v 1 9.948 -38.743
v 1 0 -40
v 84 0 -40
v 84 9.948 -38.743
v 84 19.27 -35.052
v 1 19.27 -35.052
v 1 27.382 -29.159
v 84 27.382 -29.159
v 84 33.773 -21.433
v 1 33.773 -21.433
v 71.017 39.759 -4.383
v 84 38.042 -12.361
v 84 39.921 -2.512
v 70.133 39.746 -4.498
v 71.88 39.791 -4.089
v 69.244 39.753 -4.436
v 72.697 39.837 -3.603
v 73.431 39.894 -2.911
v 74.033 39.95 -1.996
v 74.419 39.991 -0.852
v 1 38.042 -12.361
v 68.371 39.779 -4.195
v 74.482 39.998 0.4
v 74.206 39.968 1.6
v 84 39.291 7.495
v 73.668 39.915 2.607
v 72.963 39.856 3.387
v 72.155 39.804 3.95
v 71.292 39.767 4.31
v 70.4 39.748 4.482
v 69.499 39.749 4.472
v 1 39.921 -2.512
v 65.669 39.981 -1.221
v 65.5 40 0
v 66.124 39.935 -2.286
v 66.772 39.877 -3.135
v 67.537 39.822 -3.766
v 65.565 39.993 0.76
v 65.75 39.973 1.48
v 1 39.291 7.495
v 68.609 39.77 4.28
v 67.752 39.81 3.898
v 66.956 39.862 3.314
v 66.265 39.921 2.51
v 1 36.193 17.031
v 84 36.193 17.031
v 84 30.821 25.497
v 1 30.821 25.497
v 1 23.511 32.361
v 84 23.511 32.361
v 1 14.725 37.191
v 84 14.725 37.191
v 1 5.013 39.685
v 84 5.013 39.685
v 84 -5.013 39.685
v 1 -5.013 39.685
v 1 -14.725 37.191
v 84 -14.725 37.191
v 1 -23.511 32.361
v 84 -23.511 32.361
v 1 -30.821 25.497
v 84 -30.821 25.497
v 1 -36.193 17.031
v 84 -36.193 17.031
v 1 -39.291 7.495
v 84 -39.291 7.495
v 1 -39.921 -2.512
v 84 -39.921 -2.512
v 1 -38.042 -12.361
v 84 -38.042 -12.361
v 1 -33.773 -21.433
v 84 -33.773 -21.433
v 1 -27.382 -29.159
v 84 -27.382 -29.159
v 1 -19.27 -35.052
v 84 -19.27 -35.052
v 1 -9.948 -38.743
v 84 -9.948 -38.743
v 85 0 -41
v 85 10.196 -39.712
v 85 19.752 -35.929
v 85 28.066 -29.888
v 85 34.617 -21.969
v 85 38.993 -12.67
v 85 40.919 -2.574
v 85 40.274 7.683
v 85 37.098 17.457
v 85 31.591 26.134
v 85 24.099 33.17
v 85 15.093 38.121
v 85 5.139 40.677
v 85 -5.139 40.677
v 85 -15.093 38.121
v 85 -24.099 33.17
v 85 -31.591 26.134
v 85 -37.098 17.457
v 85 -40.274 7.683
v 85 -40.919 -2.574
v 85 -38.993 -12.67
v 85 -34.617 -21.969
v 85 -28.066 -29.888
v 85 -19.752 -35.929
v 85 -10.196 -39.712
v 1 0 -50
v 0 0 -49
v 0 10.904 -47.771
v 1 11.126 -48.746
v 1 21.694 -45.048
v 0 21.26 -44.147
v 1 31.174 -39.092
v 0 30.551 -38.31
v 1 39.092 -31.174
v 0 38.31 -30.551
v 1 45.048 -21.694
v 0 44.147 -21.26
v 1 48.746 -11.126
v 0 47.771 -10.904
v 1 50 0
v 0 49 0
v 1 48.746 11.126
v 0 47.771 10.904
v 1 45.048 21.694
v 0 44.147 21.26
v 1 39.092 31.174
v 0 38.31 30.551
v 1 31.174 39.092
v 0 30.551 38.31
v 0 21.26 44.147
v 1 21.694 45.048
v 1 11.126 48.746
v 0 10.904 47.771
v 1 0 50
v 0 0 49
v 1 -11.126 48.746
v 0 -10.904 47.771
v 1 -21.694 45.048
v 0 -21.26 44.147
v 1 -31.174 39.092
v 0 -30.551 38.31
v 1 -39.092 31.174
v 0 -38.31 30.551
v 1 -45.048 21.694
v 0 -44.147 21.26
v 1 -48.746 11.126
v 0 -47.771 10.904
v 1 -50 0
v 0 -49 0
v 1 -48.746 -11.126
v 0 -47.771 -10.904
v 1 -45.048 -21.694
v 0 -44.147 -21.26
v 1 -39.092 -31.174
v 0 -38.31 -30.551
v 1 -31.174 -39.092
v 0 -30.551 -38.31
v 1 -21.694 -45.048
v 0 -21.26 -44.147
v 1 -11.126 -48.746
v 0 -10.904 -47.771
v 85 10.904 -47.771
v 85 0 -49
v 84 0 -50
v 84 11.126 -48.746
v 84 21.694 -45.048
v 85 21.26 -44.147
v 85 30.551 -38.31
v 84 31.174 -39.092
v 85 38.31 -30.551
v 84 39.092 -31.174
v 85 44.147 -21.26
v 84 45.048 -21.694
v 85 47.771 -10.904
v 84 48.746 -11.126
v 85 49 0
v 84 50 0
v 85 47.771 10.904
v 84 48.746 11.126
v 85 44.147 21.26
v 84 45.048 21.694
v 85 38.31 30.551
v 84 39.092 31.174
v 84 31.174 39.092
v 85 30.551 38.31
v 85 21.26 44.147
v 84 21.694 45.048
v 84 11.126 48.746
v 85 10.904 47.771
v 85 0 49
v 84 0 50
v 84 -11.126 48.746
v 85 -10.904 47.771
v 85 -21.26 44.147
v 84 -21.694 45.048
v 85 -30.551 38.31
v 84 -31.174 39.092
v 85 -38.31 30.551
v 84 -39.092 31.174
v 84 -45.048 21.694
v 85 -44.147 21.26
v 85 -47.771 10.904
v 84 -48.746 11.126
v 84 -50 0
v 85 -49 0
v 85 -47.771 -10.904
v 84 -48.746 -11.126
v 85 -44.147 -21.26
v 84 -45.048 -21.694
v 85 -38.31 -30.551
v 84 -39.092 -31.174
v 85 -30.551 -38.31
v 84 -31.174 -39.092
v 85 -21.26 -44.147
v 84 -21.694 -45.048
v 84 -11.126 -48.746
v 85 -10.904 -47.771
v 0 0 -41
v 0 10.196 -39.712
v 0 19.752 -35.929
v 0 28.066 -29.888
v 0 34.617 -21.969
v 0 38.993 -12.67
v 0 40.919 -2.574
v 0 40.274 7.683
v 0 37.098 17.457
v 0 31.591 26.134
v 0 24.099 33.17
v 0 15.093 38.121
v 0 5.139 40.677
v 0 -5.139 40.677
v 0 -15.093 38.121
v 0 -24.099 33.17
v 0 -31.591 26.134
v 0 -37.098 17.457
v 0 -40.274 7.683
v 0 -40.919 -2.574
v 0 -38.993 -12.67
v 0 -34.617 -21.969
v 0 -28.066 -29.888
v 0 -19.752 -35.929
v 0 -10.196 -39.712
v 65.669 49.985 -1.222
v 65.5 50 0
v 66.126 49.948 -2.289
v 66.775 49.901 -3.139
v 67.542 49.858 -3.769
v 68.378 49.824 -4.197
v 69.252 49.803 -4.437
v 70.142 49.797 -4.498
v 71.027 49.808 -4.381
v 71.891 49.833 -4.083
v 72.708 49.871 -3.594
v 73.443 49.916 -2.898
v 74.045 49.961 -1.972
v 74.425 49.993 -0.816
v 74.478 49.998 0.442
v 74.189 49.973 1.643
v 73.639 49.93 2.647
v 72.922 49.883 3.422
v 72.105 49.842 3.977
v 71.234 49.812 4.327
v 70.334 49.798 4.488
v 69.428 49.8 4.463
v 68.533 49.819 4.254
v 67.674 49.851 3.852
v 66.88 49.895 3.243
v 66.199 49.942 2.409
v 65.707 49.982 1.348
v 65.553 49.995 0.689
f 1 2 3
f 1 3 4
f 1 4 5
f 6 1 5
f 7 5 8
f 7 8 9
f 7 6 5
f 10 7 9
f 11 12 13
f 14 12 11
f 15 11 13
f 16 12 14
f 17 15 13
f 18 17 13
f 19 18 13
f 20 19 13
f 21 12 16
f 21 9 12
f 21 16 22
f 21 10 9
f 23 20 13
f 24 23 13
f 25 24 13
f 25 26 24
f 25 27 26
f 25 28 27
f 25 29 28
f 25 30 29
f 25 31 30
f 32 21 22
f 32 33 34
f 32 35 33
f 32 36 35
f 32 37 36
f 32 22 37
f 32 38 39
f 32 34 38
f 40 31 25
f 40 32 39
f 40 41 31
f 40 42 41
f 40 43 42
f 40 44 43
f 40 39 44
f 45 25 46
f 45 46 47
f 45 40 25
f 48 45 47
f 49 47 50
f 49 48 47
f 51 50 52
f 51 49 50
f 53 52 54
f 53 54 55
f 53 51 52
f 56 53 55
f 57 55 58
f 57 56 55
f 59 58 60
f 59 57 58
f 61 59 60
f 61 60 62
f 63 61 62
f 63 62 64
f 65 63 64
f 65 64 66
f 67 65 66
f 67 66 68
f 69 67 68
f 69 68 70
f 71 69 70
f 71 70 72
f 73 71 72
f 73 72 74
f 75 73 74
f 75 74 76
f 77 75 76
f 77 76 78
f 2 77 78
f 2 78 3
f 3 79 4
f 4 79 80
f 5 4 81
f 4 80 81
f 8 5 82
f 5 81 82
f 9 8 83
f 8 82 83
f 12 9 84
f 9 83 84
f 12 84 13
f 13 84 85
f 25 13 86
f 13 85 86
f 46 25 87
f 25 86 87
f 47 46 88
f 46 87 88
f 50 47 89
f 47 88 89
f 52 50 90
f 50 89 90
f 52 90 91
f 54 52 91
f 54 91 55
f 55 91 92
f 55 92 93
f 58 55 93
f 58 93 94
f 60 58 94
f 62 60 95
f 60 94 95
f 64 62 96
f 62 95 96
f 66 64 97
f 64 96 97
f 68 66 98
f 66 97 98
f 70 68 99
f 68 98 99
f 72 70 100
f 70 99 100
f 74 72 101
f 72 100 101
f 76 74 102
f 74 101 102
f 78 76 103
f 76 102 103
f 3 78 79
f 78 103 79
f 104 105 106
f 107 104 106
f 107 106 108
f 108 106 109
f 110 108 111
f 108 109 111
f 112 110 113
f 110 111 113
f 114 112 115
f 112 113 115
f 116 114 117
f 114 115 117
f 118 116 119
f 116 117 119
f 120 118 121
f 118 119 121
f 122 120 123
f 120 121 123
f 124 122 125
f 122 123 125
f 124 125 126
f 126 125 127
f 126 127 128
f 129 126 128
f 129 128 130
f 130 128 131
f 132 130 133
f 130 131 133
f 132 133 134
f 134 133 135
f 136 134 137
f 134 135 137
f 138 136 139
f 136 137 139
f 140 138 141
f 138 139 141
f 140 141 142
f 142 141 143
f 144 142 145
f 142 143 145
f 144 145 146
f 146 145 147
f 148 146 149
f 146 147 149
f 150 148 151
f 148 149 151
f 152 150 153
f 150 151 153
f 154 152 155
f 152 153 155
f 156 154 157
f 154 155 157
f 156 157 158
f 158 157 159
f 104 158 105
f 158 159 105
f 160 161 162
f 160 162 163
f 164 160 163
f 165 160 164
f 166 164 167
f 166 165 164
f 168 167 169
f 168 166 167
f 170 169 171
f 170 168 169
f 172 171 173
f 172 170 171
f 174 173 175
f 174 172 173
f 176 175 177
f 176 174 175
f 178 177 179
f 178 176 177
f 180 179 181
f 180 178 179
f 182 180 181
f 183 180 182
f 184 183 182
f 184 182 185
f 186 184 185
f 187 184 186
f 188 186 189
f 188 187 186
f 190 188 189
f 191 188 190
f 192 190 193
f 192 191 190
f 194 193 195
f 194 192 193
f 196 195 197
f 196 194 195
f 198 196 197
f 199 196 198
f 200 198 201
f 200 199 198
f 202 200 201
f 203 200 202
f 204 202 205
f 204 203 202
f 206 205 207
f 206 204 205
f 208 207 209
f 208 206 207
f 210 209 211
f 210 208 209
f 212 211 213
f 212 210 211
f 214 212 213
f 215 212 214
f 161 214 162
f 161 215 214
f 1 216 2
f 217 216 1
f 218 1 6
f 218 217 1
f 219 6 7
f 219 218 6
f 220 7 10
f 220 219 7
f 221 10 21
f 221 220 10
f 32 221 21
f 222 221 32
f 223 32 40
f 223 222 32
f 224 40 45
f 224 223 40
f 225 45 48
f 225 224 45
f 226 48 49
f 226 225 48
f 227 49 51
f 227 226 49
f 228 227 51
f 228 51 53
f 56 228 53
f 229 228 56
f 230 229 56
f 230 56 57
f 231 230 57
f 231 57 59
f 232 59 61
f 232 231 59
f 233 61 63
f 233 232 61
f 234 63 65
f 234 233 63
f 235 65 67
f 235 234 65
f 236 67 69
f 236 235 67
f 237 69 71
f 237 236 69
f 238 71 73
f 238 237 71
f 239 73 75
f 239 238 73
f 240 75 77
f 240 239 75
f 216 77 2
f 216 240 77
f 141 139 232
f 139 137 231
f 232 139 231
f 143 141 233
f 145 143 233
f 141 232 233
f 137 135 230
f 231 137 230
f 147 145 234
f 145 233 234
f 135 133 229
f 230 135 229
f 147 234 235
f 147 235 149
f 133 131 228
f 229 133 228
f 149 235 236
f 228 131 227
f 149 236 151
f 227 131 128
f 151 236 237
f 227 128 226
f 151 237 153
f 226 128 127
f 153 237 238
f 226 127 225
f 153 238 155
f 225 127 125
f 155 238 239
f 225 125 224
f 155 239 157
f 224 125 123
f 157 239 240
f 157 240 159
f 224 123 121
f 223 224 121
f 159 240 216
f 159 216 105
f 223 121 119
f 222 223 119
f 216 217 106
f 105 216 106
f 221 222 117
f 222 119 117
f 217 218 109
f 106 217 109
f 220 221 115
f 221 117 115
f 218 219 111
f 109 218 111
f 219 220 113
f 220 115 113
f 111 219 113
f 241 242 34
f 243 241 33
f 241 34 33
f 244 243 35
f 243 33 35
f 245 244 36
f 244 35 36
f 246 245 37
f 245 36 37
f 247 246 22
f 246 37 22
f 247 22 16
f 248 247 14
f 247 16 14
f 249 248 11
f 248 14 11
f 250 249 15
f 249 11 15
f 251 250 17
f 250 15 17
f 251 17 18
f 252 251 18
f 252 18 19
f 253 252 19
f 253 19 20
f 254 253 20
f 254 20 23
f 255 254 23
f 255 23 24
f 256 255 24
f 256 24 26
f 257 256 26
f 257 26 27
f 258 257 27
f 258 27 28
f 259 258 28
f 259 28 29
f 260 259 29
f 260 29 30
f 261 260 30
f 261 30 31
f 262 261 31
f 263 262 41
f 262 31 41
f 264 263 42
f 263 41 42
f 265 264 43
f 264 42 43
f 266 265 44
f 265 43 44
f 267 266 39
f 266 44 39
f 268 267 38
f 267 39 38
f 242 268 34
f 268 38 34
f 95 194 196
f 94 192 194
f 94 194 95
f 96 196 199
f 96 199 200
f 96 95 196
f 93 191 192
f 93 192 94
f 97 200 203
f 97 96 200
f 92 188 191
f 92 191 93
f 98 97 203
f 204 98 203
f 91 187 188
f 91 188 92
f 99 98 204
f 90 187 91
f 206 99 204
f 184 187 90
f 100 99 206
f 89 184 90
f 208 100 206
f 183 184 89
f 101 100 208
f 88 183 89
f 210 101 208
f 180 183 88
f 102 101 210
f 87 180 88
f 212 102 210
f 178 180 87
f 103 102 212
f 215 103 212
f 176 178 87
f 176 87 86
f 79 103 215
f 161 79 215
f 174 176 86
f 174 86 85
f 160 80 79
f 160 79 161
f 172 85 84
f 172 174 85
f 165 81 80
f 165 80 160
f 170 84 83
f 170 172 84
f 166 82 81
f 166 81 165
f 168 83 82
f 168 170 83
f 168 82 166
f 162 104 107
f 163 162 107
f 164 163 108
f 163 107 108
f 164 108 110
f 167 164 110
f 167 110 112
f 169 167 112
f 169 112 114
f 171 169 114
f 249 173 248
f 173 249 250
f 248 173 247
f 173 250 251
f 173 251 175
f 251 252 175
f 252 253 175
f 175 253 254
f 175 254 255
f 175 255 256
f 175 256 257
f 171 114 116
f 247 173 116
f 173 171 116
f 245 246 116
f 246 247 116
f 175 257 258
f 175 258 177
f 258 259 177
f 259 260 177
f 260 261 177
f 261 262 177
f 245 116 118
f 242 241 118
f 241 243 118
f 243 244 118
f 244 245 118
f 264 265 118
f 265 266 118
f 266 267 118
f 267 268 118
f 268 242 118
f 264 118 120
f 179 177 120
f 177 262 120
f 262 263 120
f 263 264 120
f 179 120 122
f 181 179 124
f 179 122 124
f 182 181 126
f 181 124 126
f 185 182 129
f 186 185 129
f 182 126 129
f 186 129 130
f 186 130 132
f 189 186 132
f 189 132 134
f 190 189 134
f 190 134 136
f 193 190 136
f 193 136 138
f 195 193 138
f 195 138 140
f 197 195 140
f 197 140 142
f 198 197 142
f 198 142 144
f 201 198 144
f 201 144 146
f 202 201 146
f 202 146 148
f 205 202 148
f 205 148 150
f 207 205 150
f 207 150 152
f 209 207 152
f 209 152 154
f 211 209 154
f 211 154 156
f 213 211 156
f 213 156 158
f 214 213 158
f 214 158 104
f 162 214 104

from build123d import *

# Parameters (mm, degrees)
SKETCH_1_R      = 50
SKETCH_1_R_2    = 40
EXTRUDE_1_DEPTH = 85
CHAMFER_1_SIZE  = 1
M10X1_0_1_D     = 9
M10X1_0_1_DEPTH = 25
M10X1_0_1_TIP   = 2.703872786


with BuildPart() as part:
    # 草图1 → 凸台-拉伸1 (new body)
    with BuildSketch(Plane(origin=(0, 0, 0), x_dir=(0, 0, -1), z_dir=(1, 0, 0))):
        Circle(SKETCH_1_R)
        Circle(SKETCH_1_R_2, mode=Mode.SUBTRACT)
    extrude(amount=EXTRUDE_1_DEPTH)

    # 倒角1
    chamfer_1_edges = [part.edges().sort_by_distance(p)[0] for p in [
        (0, 0, 50),
        (85, 0, 50),
        (0, 0, 40),
        (85, 0, 40),
    ]]
    chamfer(chamfer_1_edges, length=CHAMFER_1_SIZE)

    # M10x1.0 螺纹孔1
    with Locations(Plane(origin=(0, 50, 0), x_dir=(1, 0, 0), z_dir=(0, 1, 0))):
        with Locations((70, 0)):
            Hole(M10X1_0_1_D / 2, depth=M10X1_0_1_DEPTH)
            with Locations((0, 0, -(M10X1_0_1_DEPTH + M10X1_0_1_TIP / 2))):  # 118° drill point
                Cone(0, M10X1_0_1_D / 2, M10X1_0_1_TIP, mode=Mode.SUBTRACT)


solid = part.part
